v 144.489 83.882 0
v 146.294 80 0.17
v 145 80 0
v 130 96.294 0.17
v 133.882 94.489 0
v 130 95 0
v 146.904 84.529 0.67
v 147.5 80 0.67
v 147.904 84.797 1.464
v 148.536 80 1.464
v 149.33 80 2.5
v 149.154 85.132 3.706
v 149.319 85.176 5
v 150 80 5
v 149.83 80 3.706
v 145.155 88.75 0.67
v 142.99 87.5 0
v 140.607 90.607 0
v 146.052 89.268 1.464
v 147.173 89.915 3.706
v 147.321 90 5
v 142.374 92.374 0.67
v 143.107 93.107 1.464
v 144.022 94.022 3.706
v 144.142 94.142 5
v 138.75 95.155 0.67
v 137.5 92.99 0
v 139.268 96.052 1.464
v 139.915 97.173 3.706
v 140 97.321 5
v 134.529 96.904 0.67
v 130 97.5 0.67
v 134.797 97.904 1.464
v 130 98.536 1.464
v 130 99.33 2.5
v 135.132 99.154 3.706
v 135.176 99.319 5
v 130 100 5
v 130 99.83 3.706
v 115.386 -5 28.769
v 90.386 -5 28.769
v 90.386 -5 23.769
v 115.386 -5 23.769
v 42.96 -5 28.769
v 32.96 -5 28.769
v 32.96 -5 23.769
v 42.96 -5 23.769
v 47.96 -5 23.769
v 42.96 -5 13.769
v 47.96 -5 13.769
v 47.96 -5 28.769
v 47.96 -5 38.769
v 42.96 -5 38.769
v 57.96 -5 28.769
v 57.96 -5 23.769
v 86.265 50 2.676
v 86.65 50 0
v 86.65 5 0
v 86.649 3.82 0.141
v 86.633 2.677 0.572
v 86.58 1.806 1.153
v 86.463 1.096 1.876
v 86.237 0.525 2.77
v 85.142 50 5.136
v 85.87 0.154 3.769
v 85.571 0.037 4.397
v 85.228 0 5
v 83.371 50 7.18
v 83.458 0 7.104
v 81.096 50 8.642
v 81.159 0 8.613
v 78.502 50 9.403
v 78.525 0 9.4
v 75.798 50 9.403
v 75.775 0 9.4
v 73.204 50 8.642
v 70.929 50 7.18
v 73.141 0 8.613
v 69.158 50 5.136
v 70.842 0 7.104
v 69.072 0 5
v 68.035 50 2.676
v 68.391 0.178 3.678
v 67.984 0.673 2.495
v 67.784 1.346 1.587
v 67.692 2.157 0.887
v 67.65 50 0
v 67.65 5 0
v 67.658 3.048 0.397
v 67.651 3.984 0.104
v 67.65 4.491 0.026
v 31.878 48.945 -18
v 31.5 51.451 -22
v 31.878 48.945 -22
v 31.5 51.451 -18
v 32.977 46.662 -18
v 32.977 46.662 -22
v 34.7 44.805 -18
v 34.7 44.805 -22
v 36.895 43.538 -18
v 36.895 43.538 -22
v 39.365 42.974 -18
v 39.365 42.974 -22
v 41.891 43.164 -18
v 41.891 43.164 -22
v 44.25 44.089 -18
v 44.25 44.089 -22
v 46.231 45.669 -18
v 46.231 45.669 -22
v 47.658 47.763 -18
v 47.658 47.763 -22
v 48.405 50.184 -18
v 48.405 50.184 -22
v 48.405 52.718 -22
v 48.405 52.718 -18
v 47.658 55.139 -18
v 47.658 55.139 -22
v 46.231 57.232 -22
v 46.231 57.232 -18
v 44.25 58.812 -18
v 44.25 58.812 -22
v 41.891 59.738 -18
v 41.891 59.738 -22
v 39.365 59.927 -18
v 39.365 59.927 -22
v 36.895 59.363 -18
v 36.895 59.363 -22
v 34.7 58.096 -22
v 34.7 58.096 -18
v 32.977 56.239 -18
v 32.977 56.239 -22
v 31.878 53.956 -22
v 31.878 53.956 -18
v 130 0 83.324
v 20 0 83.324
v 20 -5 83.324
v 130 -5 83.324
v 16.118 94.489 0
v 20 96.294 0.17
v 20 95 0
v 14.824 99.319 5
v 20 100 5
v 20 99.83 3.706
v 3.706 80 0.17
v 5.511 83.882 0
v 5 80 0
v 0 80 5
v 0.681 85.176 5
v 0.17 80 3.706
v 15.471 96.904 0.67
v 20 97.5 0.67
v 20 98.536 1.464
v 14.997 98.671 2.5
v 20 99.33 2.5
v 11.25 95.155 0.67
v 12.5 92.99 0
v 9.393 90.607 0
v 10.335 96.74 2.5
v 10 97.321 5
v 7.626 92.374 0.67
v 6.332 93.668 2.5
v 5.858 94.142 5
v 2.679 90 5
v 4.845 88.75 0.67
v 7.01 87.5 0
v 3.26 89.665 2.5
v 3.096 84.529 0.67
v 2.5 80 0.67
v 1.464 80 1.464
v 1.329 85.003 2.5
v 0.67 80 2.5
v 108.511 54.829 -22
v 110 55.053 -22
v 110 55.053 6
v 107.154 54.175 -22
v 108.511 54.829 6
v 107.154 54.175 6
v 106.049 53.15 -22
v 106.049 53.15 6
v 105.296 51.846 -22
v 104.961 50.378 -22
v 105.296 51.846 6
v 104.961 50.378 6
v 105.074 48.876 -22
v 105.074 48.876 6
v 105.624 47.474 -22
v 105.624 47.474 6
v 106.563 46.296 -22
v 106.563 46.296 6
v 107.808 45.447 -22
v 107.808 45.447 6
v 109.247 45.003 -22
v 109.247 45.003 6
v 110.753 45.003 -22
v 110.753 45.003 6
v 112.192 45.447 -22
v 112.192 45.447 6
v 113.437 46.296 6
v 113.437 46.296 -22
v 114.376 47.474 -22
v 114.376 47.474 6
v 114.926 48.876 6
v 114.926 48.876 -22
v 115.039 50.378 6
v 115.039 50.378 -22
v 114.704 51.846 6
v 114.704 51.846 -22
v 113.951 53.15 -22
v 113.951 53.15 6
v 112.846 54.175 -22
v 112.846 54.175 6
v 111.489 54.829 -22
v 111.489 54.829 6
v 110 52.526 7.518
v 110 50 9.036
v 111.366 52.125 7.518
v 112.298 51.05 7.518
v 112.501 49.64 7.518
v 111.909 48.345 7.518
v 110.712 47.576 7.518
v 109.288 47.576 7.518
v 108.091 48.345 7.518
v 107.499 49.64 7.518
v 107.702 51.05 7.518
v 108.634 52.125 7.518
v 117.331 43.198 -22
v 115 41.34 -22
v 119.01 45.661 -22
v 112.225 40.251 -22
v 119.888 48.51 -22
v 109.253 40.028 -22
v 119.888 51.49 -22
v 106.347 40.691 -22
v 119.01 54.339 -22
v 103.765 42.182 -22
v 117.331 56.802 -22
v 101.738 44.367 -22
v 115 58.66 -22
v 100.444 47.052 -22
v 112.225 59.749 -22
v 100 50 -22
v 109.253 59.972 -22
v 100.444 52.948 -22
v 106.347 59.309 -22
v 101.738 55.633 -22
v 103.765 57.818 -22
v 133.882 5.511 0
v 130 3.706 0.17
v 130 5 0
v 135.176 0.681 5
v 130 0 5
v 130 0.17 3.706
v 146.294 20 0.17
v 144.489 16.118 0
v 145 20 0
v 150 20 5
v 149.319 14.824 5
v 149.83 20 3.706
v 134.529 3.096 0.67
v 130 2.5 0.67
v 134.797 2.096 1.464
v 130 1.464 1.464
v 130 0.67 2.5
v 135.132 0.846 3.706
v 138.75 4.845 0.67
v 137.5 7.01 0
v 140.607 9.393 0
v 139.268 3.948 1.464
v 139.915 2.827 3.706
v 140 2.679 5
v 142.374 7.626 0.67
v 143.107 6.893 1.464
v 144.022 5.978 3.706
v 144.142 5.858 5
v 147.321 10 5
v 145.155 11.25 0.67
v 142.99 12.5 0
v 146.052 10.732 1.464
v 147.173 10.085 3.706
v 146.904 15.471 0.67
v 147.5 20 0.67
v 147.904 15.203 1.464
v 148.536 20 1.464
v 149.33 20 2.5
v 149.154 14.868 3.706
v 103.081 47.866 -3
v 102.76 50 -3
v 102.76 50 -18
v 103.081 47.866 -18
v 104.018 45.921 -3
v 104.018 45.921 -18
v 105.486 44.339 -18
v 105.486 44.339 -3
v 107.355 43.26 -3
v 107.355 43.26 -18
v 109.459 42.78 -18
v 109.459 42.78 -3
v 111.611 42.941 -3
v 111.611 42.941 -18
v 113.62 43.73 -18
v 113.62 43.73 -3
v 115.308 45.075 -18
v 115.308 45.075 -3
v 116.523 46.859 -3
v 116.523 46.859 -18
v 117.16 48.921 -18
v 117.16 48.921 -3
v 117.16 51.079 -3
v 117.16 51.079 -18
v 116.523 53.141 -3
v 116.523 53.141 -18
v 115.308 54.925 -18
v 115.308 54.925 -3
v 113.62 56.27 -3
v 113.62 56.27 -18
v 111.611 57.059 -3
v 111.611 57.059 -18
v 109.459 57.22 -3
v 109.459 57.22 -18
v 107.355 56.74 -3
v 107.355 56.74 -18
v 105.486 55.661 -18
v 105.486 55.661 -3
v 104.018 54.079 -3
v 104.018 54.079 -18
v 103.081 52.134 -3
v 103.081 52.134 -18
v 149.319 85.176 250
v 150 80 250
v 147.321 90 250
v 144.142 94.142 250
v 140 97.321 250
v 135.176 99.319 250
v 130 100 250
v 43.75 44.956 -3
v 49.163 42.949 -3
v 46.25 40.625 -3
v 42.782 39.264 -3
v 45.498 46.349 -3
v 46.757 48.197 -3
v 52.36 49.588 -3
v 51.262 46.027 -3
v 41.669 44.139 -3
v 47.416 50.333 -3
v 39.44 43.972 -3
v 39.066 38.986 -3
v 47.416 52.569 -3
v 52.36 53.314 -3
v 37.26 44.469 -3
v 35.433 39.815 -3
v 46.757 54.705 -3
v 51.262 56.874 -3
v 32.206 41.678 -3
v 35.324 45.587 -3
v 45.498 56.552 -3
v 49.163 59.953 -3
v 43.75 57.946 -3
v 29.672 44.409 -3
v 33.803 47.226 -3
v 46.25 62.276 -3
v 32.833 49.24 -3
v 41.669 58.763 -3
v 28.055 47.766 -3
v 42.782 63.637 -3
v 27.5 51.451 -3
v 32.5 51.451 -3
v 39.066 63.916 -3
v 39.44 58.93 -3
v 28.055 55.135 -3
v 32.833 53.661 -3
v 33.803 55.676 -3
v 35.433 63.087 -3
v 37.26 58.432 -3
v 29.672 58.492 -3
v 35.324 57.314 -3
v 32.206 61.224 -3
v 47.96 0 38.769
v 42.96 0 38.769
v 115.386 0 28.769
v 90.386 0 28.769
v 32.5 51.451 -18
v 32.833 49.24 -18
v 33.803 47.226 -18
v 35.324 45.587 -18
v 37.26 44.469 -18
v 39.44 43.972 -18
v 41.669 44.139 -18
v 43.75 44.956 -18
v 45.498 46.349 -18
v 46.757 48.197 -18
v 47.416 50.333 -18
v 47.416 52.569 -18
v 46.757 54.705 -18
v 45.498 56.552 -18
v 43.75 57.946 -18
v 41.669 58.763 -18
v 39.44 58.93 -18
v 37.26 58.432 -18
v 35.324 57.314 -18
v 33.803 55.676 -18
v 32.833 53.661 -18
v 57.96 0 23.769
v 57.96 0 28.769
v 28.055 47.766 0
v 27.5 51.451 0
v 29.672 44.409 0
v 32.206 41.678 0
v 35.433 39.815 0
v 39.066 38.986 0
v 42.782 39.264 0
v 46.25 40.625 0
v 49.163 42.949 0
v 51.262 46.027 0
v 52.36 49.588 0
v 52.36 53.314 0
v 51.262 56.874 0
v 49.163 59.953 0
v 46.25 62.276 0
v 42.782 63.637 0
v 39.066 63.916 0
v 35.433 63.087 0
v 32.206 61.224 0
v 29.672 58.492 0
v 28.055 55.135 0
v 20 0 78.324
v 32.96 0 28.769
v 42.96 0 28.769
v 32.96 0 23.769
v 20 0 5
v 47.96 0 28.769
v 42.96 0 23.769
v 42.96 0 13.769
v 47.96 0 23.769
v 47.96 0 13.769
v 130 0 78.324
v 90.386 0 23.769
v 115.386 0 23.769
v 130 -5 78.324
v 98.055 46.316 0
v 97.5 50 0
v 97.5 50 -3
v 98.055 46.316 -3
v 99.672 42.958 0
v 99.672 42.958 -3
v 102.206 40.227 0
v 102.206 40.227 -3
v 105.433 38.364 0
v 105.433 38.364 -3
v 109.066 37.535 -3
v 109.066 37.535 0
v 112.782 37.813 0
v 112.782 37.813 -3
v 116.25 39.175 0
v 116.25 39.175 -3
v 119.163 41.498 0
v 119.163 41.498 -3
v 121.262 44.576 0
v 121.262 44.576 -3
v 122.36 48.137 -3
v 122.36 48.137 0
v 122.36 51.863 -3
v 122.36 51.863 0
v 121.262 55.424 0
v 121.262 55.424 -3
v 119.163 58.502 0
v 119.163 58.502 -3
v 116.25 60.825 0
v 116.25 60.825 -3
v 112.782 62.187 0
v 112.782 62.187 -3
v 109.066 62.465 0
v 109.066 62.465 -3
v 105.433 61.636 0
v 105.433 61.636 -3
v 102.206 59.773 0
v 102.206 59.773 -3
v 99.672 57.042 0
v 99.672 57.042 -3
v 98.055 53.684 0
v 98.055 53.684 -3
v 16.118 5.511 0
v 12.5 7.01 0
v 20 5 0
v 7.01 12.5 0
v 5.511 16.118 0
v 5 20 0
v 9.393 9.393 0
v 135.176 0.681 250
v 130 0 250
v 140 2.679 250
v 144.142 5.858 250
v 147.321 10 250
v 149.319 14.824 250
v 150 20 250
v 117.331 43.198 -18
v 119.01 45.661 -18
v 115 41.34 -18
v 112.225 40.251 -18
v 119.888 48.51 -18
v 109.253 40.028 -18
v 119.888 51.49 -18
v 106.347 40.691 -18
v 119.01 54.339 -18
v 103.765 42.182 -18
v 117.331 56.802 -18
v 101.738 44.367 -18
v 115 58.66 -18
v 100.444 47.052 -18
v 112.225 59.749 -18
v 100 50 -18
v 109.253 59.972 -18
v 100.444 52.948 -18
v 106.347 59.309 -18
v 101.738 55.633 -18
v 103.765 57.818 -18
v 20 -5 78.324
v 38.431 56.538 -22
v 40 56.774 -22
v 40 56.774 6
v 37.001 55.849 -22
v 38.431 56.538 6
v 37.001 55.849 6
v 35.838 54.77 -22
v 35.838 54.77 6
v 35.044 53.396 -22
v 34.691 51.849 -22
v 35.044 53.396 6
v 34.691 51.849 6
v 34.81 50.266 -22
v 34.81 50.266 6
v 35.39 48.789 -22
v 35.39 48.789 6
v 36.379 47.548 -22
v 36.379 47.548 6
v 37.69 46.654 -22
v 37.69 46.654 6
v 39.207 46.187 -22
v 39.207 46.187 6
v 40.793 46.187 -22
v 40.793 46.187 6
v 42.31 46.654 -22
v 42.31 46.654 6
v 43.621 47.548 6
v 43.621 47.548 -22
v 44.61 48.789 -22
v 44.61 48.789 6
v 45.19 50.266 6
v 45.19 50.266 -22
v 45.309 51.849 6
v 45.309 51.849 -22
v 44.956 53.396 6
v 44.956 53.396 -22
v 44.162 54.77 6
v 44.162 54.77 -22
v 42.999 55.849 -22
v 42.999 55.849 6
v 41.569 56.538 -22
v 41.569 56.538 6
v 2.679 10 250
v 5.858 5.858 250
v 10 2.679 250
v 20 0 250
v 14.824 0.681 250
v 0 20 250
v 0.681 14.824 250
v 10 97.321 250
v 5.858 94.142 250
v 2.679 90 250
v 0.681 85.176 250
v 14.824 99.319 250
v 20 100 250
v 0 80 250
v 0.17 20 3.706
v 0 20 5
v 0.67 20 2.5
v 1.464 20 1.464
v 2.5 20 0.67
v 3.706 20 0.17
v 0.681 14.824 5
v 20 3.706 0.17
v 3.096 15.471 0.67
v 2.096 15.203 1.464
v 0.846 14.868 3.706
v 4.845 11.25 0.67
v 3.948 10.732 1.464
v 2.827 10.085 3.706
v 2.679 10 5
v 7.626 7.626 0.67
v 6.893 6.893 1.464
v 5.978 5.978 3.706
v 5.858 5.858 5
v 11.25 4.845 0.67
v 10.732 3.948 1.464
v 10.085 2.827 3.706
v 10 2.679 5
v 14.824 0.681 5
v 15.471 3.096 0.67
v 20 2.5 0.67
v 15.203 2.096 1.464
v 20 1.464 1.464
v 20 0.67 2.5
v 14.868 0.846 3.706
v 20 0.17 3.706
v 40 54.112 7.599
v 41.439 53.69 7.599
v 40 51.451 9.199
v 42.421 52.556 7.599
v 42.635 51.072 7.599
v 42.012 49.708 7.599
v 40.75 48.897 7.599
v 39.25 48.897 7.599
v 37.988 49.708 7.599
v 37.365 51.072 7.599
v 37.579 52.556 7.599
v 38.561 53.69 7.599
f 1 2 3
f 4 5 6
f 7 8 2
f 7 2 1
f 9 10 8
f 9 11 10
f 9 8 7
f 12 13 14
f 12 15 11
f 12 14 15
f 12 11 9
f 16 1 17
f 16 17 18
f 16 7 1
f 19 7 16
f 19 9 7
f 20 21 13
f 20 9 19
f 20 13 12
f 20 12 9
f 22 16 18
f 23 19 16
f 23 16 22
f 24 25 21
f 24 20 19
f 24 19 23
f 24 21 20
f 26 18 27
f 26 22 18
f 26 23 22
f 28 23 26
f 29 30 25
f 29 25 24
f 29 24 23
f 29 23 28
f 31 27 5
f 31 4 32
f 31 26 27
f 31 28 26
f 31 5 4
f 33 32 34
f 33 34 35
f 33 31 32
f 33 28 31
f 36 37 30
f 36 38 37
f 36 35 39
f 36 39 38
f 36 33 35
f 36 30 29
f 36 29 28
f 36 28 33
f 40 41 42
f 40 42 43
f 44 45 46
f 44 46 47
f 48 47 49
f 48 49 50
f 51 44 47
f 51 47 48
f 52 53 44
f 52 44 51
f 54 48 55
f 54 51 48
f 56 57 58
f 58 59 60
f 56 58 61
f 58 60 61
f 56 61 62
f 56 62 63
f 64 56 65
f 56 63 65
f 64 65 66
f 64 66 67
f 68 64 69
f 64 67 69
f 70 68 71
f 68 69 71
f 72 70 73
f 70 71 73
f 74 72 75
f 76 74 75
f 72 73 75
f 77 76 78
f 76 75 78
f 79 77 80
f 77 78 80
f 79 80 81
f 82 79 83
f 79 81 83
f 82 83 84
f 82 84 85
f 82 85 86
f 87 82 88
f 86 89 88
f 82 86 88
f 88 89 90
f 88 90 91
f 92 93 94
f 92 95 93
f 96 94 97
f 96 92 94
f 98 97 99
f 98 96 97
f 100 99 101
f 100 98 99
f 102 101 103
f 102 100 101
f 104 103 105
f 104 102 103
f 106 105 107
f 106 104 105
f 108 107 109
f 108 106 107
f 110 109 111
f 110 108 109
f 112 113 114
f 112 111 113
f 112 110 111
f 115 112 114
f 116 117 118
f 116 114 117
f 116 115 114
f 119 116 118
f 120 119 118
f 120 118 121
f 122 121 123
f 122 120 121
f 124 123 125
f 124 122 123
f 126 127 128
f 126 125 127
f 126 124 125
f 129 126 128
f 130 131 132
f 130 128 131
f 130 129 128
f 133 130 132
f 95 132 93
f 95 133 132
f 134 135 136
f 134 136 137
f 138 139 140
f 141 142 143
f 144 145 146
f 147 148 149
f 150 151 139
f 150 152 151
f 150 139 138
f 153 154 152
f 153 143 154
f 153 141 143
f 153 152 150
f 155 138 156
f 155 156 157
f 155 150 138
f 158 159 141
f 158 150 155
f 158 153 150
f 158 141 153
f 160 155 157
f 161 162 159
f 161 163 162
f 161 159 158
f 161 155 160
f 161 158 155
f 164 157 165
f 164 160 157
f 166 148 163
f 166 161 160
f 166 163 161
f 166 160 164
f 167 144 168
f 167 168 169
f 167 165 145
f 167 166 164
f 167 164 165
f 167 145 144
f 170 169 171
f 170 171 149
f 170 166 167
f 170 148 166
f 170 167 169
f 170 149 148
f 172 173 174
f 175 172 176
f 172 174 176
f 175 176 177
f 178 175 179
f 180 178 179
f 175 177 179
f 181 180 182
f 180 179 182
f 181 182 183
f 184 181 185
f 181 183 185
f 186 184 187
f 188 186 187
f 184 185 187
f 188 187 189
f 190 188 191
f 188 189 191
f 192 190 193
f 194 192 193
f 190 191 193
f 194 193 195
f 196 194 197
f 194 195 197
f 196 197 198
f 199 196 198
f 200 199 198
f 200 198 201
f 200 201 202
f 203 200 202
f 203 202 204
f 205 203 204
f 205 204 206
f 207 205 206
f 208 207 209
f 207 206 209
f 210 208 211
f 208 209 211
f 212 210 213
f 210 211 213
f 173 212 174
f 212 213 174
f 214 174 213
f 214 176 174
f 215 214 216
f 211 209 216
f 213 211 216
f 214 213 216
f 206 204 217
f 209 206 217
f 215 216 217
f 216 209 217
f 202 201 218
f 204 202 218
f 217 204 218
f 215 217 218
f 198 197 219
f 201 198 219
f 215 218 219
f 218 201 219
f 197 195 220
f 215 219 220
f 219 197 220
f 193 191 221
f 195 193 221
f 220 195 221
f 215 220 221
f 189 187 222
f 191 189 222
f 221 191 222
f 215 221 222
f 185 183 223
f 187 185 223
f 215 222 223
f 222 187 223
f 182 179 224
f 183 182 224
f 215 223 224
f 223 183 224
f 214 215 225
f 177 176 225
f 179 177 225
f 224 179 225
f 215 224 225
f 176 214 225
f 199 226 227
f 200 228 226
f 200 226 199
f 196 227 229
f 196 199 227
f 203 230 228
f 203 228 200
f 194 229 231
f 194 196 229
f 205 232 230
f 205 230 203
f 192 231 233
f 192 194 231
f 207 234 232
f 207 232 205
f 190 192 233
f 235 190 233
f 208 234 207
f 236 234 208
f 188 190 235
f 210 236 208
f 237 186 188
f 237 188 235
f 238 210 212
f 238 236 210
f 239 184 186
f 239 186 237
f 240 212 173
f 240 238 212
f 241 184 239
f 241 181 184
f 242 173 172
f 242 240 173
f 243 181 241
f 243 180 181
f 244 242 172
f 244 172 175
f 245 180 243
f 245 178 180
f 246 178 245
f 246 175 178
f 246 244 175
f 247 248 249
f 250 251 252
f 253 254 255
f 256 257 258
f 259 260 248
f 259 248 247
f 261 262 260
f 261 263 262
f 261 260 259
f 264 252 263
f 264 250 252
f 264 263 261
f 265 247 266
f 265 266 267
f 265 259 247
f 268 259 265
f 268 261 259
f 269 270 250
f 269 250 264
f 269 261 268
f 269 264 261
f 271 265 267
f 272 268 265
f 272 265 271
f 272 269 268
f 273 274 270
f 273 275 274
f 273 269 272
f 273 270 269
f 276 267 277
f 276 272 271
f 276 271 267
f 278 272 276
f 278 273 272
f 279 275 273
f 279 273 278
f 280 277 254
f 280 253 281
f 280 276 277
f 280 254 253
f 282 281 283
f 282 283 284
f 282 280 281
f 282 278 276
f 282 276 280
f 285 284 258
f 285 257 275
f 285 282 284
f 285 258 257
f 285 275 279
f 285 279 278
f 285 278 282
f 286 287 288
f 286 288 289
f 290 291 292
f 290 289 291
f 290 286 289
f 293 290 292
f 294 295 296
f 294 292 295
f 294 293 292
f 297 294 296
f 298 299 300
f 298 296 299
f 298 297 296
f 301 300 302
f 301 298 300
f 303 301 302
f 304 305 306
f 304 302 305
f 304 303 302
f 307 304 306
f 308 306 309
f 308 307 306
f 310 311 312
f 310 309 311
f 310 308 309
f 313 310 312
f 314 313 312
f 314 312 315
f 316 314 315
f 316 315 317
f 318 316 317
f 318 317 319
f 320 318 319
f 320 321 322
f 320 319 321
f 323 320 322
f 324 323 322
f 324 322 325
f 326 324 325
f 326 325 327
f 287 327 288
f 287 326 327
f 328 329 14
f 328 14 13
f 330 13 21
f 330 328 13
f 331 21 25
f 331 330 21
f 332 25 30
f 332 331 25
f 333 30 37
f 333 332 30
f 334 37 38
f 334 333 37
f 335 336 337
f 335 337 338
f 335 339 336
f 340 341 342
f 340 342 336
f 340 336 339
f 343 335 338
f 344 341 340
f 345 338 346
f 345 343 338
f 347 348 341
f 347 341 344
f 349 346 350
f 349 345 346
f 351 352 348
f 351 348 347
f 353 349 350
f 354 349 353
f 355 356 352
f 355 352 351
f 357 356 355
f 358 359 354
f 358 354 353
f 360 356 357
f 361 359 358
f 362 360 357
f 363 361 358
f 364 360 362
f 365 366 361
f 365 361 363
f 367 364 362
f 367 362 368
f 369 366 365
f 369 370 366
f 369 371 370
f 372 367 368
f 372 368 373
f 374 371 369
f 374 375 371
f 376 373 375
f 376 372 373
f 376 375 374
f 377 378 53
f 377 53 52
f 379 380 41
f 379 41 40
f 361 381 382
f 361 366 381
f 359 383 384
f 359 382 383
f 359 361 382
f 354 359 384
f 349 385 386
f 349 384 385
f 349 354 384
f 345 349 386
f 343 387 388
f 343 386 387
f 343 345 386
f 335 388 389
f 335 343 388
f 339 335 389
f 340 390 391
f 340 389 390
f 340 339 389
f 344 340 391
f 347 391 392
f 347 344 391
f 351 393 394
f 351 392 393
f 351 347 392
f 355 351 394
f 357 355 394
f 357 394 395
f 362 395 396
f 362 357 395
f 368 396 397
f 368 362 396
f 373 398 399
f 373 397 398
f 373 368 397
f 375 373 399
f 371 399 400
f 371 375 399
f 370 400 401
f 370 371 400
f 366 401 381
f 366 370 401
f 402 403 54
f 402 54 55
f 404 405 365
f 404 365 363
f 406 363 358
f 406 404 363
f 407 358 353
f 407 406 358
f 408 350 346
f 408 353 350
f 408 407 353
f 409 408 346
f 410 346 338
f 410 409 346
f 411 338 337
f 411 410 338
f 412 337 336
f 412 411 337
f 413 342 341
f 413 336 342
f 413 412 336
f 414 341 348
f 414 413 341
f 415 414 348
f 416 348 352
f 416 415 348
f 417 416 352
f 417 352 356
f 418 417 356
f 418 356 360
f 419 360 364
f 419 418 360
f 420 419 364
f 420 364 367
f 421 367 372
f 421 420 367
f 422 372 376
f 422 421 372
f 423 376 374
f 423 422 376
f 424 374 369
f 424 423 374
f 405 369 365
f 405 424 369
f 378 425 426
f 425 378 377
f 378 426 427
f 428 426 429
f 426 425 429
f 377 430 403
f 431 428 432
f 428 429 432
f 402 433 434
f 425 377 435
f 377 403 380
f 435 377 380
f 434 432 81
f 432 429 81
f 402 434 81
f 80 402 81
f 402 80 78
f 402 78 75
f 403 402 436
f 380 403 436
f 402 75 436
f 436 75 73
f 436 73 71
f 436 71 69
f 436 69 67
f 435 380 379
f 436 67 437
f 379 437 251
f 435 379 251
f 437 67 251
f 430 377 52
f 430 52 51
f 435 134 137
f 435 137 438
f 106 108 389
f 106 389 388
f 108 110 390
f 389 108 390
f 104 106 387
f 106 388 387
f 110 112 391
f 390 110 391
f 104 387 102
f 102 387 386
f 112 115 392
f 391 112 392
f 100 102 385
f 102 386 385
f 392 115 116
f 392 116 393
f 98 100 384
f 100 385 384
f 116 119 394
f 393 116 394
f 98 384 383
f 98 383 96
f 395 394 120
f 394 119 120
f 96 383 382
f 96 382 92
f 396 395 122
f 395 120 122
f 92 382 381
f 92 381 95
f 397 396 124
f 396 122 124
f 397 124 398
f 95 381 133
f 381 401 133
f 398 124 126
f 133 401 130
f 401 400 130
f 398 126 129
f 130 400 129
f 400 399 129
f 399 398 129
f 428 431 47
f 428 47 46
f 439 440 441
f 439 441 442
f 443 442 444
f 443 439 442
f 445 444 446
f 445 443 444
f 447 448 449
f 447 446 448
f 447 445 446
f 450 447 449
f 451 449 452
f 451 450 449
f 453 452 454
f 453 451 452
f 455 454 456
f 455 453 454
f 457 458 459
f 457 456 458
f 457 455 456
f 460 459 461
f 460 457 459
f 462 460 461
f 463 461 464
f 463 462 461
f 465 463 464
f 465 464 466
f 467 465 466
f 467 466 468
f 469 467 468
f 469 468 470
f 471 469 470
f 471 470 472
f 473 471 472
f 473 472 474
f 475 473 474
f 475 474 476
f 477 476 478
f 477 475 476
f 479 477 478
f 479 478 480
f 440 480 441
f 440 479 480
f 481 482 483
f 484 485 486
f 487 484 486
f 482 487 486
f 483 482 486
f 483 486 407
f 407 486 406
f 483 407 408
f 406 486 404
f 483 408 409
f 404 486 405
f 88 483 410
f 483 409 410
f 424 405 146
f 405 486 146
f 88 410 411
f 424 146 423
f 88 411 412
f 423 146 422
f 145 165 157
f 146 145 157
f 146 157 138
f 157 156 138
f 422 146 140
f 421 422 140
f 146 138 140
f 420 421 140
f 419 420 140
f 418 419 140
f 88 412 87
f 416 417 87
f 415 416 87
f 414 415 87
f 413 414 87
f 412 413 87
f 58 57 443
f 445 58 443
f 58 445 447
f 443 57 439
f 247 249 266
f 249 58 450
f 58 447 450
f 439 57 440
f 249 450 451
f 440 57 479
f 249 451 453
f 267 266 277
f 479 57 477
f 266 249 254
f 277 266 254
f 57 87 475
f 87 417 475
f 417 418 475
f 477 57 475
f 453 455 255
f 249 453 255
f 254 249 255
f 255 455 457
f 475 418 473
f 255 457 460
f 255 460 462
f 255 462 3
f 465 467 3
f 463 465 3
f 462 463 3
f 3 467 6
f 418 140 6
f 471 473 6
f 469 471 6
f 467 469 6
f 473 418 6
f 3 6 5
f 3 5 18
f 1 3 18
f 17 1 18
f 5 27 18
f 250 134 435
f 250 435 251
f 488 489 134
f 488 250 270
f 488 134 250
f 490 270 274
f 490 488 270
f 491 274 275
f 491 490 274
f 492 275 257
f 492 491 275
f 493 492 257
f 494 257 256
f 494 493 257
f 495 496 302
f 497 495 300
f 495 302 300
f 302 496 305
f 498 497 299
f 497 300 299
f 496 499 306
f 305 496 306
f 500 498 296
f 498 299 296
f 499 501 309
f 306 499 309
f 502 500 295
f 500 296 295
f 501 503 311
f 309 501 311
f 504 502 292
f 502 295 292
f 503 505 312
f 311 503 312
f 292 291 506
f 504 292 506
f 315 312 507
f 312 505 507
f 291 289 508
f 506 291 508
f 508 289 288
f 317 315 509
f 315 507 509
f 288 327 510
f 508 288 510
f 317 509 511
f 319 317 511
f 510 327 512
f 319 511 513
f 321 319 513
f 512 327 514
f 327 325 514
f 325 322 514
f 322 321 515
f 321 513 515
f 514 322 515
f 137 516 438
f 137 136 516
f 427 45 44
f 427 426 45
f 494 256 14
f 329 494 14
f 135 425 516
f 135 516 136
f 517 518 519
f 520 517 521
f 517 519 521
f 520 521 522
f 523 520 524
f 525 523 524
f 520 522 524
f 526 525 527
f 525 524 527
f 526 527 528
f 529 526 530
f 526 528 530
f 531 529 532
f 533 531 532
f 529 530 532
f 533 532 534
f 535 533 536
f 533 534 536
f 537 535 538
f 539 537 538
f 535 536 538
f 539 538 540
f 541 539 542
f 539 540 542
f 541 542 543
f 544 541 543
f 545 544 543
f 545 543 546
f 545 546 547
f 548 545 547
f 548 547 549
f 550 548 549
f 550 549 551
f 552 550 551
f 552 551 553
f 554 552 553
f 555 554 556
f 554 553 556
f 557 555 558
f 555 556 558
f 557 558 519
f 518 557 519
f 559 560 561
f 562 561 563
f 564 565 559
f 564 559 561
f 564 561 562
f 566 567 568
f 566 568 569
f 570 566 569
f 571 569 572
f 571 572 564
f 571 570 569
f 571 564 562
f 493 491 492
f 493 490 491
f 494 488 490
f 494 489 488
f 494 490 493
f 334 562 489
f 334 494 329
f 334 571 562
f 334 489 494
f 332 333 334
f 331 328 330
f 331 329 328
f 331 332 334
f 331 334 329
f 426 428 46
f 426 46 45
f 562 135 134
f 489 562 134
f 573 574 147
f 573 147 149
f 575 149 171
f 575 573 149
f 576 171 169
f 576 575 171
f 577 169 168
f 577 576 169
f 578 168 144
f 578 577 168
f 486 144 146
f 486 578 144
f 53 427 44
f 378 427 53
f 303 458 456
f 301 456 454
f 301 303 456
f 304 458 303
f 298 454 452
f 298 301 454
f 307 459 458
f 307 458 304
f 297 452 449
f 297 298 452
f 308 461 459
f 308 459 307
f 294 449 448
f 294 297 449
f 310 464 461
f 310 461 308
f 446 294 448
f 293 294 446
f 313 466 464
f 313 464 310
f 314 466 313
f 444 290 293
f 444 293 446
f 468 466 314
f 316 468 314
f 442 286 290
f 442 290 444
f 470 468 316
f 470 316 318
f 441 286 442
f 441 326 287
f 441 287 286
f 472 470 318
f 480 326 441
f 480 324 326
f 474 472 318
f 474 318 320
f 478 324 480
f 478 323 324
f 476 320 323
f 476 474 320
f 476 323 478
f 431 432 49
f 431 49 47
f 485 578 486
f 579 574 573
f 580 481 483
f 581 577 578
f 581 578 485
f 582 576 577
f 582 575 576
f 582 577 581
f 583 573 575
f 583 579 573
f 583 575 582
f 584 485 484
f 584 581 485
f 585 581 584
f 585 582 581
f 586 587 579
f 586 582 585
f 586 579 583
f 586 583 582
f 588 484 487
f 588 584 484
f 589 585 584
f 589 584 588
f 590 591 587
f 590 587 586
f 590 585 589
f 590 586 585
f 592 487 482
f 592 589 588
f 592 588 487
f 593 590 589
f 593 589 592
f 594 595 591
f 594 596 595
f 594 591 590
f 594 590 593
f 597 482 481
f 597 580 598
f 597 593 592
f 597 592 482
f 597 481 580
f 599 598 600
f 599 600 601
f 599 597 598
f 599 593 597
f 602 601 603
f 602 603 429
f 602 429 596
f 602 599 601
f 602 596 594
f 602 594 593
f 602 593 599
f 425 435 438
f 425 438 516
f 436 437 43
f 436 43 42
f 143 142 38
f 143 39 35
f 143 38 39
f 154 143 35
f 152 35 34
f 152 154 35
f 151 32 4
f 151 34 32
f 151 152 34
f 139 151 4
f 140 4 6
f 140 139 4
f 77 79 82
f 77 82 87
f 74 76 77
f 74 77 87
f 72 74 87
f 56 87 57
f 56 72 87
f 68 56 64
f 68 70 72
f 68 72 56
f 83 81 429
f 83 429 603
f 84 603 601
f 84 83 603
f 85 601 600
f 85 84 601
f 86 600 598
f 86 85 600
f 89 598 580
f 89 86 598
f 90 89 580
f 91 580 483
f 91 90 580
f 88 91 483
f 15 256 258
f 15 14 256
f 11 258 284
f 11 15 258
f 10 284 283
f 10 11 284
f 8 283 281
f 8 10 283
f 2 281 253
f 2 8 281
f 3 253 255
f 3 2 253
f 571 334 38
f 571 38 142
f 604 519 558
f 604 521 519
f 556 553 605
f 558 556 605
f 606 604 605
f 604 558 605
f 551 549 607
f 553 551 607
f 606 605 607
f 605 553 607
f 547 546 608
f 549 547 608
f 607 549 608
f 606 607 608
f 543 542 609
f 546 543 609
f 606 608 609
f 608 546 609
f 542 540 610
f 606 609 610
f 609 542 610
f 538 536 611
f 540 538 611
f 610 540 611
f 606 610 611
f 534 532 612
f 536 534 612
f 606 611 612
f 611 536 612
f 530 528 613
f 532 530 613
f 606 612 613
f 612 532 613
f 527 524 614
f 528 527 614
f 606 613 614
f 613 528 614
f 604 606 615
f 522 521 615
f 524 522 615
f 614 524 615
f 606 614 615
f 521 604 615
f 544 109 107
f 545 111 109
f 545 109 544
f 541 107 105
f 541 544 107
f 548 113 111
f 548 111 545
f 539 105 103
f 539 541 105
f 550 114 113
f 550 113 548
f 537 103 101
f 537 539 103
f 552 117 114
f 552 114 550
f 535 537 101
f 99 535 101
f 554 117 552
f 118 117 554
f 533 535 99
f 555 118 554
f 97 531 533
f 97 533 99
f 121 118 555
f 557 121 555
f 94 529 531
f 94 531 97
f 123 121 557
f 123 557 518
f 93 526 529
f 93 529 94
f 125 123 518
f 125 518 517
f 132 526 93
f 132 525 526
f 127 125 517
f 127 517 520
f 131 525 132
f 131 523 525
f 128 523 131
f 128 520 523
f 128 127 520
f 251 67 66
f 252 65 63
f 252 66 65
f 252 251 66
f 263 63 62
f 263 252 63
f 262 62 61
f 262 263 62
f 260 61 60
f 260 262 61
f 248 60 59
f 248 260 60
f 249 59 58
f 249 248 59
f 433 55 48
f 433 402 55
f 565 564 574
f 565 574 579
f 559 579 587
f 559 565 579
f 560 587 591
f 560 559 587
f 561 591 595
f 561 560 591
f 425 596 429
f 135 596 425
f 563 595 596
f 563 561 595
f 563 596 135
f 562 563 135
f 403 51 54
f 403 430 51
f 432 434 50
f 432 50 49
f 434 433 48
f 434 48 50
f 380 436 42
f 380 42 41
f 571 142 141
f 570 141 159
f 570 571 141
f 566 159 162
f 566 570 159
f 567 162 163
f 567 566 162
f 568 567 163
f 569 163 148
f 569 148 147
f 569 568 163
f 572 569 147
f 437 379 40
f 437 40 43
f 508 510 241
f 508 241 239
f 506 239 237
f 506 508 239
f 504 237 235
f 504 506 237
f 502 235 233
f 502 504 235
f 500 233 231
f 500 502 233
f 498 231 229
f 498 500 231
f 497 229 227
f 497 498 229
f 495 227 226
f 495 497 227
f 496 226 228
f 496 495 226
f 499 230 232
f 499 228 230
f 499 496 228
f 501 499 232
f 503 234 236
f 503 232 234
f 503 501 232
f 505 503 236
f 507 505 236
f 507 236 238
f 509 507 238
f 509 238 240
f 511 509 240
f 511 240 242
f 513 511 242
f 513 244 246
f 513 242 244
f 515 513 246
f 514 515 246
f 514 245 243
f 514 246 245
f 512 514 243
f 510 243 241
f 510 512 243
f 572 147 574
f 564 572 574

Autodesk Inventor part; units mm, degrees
ref_plane "YZ Plane" through (0, 0, 0) normal (1, 0, 0) x (0, 1, 0)
ref_plane "XZ Plane" through (0, 0, 0) normal (0, 1, 0) x (-1, 0, 0)
ref_plane "XY Plane" through (0, 0, 0) normal (0, 0, 1) x (1, 0, 0)
sketch "Sketch1" plane through (0, 0, 0) normal (0, 0, 1) x (1, 0, 0)
  line L0 (0, 0) -> (150, 0)
  line L1 (150, 0) -> (150, 100)
  line L2 (150, 100) -> (0, 100)
  line L3 (0, 100) -> (0, 0)
  dimension "d0" = 150
  dimension "d1" = 100
extrude "Extrusion1" add sketch "Sketch1" along normal blind 250
fillet "Fillet1" radius 20 1 edges at (150, 100, 125)
fillet "Fillet2" radius 20 1 edges at (150, 0, 125)
fillet "Fillet3" radius 20 1 edges at (0, 100, 125)
fillet "Fillet4" radius 20 1 edges at (0, 0, 125)
fillet "Fillet5" radius 5 8 edges at (5.8579, 94.1421, 0) (0, 50, 0) (5.8579, 5.8579, 0) (75, 0, 0) (144.1421, 5.8579, 0) (150, 50, 0) (144.1421, 94.1421, 0) (75, 100, 0)
sketch "Sketch2" plane through (20, 0, 250) normal (0, -1, 0) x (1, 0, 0)
  line L0 (110, 0) -> (110, -245) projected
  line L1 (0, -245) -> (0, 0) projected
  line L2 (110, -171.6757) -> (0, -171.6757)
  line L3 (0, -171.6757) -> (0, -166.6757)
  line L4 (0, -166.6757) -> (110, -166.6757)
  line L5 (110, -166.6757) -> (110, -171.6757)
  line L6 (95.3863, -226.2308) -> (70.3863, -226.2308)
  line L7 (70.3863, -226.2308) -> (70.3863, -221.2308)
  line L8 (70.3863, -221.2308) -> (95.3863, -221.2308)
  line L9 (95.3863, -221.2308) -> (95.3863, -226.2308)
  line L10 (37.9599, -226.2308) -> (12.9599, -226.2308)
  line L11 (12.9599, -226.2308) -> (12.9599, -221.2308)
  line L12 (12.9599, -221.2308) -> (37.9599, -221.2308)
  line L13 (37.9599, -221.2308) -> (37.9599, -226.2308)
  line L14 (27.9599, -236.2308) -> (22.9599, -236.2308)
  line L15 (22.9599, -236.2308) -> (22.9599, -211.2308)
  line L16 (22.9599, -211.2308) -> (27.9599, -211.2308)
  line L17 (27.9599, -211.2308) -> (27.9599, -236.2308)
  point P0 (-20, -250)
  point P1 (27.9599, -226.2308)
  point P2 (27.9599, -221.2308)
  point P3 (22.9599, -221.2308)
  point P4 (22.9599, -226.2308)
  dimension "d9" = 25
  dimension "d10" = 5
  dimension "d11" = 5
  dimension "d12" = 25
  dimension "d13" = 10
  dimension "d14" = 10
  dimension "d15" = 5
  dimension "d16" = 25
  dimension "d17" = 5
extrude "Extrusion2" add sketch "Sketch2" along normal blind 5
sketch "Sketch3" plane through (0, 0, 0) normal (0, 0, -1) x (-1, 0, 0)
  line L0 (-20, 100) -> (-130, 100) projected
  line L1 (-150, 80) -> (-150, 20) projected
  circle A0 centre (-110, 50) radius 12.5
  circle A1 centre (-40, 51.4507) radius 12.5
  point P0 (0, 0)
  point P1 (-150, 50)
  dimension "d20" = 50
  dimension "d21" = 40
  dimension "d22" = 70
  dimension "d23" = 25
  dimension "d24" = 25
extrude "Extrusion3" add sketch "Sketch3" along normal blind 3
sketch "Sketch4" plane through (110, 50, -3) normal (0, 0, -1) x (-1, 0, 0)
  circle A0 centre (0, 0) radius 7.2404
  circle A1 centre (70, 1.4507) radius 12.5 projected
  circle A2 centre (70, 1.4507) radius 7.5
  point P0 (110, -50)
  dimension "d27" = 15
extrude "Extrusion4" add sketch "Sketch4" along normal blind 15 contours A0 | A2
sketch "Sketch5" plane through (110, 50, -18) normal (0, 0, -1) x (-1, 0, 0)
  circle A0 centre (0, 0) radius 7.2404 projected
  circle A1 centre (0, 0) radius 10
  circle A2 centre (70, 1.4507) radius 7.5 projected
  circle A3 centre (70, 1.4507) radius 8.5
  point P0 (110, -50)
  dimension "d30" = 20
  dimension "d31" = 17
extrude "Extrusion5" add sketch "Sketch5" along normal blind 4 contours A0 | A1 | A2 | A3
sketch "Sketch6" plane through (110, 50, -22) normal (0, 0, -1) x (-1, 0, 0)
  circle A0 centre (0, 0) radius 10 projected
  point P0 (110, -50)
hole "Hole1" at (110, 50, -22) direction (0, 0, 1) diameter 10.106 depth 28 tip angle 118 thread size "M12x1.75" class "6H" standard "ISO Metric profile"
sketch "Sketch7" plane through (40, 51.4507, -22) normal (0, 0, -1) x (-1, 0, 0)
  circle A0 centre (0, 0) radius 8.5 projected
  point P0 (40, -51.4507)
hole "Hole2" at (40, 51.4507, -22) direction (0, 0, 1) diameter 10.647 depth 28 tip angle 118 thread size "M12x1.25" class "6H" standard "ISO Metric profile"
sketch "Sketch8" plane through (0, 20, 250) normal (-1, 0, 0) x (0, 0, 1)
  line L0 (-245, 80) -> (-245, 60) projected
  line L1 (-245, 60) -> (-73.5714, 60) construction
  line L2 (-73.5714, 60) -> (-73.5714, 0) construction
  line L3 (-73.5714, 0) -> (-245, 0) construction
  line L4 (-245, 0) -> (-245, 60) construction
  line L5 (-245, 0) -> (-245, 60) projected
  point P0 (-250, -20)
decal "Decal1"
sketch "Sketch9" plane through (20, 100, 250) normal (0, 1, 0) x (1, 0, 0)
  line L0 (0, 250) -> (110, 250) projected
  circle A0 centre (57.15, 250) radius 9.5
  point P0 (-20, 250)
  dimension "d50" = 19
sketch "Sketch10" plane through (20, 0, 5) normal (0, -1, 0) x (1, 0, 0)
  line L0 (0, -5) -> (110, -5) projected
  circle A0 centre (57.15, -5) radius 9.5
  point P0 (-20, -5)
  point P1 (66.65, -5)
  point P2 (47.65, -5)
  dimension "d51" = 19
extrude "Extrusion6" cut sketch "Sketch10" against normal blind 50 contours A0 L0 picked at (56.7683, -1.8564)
properties part number "battery eg 26"
